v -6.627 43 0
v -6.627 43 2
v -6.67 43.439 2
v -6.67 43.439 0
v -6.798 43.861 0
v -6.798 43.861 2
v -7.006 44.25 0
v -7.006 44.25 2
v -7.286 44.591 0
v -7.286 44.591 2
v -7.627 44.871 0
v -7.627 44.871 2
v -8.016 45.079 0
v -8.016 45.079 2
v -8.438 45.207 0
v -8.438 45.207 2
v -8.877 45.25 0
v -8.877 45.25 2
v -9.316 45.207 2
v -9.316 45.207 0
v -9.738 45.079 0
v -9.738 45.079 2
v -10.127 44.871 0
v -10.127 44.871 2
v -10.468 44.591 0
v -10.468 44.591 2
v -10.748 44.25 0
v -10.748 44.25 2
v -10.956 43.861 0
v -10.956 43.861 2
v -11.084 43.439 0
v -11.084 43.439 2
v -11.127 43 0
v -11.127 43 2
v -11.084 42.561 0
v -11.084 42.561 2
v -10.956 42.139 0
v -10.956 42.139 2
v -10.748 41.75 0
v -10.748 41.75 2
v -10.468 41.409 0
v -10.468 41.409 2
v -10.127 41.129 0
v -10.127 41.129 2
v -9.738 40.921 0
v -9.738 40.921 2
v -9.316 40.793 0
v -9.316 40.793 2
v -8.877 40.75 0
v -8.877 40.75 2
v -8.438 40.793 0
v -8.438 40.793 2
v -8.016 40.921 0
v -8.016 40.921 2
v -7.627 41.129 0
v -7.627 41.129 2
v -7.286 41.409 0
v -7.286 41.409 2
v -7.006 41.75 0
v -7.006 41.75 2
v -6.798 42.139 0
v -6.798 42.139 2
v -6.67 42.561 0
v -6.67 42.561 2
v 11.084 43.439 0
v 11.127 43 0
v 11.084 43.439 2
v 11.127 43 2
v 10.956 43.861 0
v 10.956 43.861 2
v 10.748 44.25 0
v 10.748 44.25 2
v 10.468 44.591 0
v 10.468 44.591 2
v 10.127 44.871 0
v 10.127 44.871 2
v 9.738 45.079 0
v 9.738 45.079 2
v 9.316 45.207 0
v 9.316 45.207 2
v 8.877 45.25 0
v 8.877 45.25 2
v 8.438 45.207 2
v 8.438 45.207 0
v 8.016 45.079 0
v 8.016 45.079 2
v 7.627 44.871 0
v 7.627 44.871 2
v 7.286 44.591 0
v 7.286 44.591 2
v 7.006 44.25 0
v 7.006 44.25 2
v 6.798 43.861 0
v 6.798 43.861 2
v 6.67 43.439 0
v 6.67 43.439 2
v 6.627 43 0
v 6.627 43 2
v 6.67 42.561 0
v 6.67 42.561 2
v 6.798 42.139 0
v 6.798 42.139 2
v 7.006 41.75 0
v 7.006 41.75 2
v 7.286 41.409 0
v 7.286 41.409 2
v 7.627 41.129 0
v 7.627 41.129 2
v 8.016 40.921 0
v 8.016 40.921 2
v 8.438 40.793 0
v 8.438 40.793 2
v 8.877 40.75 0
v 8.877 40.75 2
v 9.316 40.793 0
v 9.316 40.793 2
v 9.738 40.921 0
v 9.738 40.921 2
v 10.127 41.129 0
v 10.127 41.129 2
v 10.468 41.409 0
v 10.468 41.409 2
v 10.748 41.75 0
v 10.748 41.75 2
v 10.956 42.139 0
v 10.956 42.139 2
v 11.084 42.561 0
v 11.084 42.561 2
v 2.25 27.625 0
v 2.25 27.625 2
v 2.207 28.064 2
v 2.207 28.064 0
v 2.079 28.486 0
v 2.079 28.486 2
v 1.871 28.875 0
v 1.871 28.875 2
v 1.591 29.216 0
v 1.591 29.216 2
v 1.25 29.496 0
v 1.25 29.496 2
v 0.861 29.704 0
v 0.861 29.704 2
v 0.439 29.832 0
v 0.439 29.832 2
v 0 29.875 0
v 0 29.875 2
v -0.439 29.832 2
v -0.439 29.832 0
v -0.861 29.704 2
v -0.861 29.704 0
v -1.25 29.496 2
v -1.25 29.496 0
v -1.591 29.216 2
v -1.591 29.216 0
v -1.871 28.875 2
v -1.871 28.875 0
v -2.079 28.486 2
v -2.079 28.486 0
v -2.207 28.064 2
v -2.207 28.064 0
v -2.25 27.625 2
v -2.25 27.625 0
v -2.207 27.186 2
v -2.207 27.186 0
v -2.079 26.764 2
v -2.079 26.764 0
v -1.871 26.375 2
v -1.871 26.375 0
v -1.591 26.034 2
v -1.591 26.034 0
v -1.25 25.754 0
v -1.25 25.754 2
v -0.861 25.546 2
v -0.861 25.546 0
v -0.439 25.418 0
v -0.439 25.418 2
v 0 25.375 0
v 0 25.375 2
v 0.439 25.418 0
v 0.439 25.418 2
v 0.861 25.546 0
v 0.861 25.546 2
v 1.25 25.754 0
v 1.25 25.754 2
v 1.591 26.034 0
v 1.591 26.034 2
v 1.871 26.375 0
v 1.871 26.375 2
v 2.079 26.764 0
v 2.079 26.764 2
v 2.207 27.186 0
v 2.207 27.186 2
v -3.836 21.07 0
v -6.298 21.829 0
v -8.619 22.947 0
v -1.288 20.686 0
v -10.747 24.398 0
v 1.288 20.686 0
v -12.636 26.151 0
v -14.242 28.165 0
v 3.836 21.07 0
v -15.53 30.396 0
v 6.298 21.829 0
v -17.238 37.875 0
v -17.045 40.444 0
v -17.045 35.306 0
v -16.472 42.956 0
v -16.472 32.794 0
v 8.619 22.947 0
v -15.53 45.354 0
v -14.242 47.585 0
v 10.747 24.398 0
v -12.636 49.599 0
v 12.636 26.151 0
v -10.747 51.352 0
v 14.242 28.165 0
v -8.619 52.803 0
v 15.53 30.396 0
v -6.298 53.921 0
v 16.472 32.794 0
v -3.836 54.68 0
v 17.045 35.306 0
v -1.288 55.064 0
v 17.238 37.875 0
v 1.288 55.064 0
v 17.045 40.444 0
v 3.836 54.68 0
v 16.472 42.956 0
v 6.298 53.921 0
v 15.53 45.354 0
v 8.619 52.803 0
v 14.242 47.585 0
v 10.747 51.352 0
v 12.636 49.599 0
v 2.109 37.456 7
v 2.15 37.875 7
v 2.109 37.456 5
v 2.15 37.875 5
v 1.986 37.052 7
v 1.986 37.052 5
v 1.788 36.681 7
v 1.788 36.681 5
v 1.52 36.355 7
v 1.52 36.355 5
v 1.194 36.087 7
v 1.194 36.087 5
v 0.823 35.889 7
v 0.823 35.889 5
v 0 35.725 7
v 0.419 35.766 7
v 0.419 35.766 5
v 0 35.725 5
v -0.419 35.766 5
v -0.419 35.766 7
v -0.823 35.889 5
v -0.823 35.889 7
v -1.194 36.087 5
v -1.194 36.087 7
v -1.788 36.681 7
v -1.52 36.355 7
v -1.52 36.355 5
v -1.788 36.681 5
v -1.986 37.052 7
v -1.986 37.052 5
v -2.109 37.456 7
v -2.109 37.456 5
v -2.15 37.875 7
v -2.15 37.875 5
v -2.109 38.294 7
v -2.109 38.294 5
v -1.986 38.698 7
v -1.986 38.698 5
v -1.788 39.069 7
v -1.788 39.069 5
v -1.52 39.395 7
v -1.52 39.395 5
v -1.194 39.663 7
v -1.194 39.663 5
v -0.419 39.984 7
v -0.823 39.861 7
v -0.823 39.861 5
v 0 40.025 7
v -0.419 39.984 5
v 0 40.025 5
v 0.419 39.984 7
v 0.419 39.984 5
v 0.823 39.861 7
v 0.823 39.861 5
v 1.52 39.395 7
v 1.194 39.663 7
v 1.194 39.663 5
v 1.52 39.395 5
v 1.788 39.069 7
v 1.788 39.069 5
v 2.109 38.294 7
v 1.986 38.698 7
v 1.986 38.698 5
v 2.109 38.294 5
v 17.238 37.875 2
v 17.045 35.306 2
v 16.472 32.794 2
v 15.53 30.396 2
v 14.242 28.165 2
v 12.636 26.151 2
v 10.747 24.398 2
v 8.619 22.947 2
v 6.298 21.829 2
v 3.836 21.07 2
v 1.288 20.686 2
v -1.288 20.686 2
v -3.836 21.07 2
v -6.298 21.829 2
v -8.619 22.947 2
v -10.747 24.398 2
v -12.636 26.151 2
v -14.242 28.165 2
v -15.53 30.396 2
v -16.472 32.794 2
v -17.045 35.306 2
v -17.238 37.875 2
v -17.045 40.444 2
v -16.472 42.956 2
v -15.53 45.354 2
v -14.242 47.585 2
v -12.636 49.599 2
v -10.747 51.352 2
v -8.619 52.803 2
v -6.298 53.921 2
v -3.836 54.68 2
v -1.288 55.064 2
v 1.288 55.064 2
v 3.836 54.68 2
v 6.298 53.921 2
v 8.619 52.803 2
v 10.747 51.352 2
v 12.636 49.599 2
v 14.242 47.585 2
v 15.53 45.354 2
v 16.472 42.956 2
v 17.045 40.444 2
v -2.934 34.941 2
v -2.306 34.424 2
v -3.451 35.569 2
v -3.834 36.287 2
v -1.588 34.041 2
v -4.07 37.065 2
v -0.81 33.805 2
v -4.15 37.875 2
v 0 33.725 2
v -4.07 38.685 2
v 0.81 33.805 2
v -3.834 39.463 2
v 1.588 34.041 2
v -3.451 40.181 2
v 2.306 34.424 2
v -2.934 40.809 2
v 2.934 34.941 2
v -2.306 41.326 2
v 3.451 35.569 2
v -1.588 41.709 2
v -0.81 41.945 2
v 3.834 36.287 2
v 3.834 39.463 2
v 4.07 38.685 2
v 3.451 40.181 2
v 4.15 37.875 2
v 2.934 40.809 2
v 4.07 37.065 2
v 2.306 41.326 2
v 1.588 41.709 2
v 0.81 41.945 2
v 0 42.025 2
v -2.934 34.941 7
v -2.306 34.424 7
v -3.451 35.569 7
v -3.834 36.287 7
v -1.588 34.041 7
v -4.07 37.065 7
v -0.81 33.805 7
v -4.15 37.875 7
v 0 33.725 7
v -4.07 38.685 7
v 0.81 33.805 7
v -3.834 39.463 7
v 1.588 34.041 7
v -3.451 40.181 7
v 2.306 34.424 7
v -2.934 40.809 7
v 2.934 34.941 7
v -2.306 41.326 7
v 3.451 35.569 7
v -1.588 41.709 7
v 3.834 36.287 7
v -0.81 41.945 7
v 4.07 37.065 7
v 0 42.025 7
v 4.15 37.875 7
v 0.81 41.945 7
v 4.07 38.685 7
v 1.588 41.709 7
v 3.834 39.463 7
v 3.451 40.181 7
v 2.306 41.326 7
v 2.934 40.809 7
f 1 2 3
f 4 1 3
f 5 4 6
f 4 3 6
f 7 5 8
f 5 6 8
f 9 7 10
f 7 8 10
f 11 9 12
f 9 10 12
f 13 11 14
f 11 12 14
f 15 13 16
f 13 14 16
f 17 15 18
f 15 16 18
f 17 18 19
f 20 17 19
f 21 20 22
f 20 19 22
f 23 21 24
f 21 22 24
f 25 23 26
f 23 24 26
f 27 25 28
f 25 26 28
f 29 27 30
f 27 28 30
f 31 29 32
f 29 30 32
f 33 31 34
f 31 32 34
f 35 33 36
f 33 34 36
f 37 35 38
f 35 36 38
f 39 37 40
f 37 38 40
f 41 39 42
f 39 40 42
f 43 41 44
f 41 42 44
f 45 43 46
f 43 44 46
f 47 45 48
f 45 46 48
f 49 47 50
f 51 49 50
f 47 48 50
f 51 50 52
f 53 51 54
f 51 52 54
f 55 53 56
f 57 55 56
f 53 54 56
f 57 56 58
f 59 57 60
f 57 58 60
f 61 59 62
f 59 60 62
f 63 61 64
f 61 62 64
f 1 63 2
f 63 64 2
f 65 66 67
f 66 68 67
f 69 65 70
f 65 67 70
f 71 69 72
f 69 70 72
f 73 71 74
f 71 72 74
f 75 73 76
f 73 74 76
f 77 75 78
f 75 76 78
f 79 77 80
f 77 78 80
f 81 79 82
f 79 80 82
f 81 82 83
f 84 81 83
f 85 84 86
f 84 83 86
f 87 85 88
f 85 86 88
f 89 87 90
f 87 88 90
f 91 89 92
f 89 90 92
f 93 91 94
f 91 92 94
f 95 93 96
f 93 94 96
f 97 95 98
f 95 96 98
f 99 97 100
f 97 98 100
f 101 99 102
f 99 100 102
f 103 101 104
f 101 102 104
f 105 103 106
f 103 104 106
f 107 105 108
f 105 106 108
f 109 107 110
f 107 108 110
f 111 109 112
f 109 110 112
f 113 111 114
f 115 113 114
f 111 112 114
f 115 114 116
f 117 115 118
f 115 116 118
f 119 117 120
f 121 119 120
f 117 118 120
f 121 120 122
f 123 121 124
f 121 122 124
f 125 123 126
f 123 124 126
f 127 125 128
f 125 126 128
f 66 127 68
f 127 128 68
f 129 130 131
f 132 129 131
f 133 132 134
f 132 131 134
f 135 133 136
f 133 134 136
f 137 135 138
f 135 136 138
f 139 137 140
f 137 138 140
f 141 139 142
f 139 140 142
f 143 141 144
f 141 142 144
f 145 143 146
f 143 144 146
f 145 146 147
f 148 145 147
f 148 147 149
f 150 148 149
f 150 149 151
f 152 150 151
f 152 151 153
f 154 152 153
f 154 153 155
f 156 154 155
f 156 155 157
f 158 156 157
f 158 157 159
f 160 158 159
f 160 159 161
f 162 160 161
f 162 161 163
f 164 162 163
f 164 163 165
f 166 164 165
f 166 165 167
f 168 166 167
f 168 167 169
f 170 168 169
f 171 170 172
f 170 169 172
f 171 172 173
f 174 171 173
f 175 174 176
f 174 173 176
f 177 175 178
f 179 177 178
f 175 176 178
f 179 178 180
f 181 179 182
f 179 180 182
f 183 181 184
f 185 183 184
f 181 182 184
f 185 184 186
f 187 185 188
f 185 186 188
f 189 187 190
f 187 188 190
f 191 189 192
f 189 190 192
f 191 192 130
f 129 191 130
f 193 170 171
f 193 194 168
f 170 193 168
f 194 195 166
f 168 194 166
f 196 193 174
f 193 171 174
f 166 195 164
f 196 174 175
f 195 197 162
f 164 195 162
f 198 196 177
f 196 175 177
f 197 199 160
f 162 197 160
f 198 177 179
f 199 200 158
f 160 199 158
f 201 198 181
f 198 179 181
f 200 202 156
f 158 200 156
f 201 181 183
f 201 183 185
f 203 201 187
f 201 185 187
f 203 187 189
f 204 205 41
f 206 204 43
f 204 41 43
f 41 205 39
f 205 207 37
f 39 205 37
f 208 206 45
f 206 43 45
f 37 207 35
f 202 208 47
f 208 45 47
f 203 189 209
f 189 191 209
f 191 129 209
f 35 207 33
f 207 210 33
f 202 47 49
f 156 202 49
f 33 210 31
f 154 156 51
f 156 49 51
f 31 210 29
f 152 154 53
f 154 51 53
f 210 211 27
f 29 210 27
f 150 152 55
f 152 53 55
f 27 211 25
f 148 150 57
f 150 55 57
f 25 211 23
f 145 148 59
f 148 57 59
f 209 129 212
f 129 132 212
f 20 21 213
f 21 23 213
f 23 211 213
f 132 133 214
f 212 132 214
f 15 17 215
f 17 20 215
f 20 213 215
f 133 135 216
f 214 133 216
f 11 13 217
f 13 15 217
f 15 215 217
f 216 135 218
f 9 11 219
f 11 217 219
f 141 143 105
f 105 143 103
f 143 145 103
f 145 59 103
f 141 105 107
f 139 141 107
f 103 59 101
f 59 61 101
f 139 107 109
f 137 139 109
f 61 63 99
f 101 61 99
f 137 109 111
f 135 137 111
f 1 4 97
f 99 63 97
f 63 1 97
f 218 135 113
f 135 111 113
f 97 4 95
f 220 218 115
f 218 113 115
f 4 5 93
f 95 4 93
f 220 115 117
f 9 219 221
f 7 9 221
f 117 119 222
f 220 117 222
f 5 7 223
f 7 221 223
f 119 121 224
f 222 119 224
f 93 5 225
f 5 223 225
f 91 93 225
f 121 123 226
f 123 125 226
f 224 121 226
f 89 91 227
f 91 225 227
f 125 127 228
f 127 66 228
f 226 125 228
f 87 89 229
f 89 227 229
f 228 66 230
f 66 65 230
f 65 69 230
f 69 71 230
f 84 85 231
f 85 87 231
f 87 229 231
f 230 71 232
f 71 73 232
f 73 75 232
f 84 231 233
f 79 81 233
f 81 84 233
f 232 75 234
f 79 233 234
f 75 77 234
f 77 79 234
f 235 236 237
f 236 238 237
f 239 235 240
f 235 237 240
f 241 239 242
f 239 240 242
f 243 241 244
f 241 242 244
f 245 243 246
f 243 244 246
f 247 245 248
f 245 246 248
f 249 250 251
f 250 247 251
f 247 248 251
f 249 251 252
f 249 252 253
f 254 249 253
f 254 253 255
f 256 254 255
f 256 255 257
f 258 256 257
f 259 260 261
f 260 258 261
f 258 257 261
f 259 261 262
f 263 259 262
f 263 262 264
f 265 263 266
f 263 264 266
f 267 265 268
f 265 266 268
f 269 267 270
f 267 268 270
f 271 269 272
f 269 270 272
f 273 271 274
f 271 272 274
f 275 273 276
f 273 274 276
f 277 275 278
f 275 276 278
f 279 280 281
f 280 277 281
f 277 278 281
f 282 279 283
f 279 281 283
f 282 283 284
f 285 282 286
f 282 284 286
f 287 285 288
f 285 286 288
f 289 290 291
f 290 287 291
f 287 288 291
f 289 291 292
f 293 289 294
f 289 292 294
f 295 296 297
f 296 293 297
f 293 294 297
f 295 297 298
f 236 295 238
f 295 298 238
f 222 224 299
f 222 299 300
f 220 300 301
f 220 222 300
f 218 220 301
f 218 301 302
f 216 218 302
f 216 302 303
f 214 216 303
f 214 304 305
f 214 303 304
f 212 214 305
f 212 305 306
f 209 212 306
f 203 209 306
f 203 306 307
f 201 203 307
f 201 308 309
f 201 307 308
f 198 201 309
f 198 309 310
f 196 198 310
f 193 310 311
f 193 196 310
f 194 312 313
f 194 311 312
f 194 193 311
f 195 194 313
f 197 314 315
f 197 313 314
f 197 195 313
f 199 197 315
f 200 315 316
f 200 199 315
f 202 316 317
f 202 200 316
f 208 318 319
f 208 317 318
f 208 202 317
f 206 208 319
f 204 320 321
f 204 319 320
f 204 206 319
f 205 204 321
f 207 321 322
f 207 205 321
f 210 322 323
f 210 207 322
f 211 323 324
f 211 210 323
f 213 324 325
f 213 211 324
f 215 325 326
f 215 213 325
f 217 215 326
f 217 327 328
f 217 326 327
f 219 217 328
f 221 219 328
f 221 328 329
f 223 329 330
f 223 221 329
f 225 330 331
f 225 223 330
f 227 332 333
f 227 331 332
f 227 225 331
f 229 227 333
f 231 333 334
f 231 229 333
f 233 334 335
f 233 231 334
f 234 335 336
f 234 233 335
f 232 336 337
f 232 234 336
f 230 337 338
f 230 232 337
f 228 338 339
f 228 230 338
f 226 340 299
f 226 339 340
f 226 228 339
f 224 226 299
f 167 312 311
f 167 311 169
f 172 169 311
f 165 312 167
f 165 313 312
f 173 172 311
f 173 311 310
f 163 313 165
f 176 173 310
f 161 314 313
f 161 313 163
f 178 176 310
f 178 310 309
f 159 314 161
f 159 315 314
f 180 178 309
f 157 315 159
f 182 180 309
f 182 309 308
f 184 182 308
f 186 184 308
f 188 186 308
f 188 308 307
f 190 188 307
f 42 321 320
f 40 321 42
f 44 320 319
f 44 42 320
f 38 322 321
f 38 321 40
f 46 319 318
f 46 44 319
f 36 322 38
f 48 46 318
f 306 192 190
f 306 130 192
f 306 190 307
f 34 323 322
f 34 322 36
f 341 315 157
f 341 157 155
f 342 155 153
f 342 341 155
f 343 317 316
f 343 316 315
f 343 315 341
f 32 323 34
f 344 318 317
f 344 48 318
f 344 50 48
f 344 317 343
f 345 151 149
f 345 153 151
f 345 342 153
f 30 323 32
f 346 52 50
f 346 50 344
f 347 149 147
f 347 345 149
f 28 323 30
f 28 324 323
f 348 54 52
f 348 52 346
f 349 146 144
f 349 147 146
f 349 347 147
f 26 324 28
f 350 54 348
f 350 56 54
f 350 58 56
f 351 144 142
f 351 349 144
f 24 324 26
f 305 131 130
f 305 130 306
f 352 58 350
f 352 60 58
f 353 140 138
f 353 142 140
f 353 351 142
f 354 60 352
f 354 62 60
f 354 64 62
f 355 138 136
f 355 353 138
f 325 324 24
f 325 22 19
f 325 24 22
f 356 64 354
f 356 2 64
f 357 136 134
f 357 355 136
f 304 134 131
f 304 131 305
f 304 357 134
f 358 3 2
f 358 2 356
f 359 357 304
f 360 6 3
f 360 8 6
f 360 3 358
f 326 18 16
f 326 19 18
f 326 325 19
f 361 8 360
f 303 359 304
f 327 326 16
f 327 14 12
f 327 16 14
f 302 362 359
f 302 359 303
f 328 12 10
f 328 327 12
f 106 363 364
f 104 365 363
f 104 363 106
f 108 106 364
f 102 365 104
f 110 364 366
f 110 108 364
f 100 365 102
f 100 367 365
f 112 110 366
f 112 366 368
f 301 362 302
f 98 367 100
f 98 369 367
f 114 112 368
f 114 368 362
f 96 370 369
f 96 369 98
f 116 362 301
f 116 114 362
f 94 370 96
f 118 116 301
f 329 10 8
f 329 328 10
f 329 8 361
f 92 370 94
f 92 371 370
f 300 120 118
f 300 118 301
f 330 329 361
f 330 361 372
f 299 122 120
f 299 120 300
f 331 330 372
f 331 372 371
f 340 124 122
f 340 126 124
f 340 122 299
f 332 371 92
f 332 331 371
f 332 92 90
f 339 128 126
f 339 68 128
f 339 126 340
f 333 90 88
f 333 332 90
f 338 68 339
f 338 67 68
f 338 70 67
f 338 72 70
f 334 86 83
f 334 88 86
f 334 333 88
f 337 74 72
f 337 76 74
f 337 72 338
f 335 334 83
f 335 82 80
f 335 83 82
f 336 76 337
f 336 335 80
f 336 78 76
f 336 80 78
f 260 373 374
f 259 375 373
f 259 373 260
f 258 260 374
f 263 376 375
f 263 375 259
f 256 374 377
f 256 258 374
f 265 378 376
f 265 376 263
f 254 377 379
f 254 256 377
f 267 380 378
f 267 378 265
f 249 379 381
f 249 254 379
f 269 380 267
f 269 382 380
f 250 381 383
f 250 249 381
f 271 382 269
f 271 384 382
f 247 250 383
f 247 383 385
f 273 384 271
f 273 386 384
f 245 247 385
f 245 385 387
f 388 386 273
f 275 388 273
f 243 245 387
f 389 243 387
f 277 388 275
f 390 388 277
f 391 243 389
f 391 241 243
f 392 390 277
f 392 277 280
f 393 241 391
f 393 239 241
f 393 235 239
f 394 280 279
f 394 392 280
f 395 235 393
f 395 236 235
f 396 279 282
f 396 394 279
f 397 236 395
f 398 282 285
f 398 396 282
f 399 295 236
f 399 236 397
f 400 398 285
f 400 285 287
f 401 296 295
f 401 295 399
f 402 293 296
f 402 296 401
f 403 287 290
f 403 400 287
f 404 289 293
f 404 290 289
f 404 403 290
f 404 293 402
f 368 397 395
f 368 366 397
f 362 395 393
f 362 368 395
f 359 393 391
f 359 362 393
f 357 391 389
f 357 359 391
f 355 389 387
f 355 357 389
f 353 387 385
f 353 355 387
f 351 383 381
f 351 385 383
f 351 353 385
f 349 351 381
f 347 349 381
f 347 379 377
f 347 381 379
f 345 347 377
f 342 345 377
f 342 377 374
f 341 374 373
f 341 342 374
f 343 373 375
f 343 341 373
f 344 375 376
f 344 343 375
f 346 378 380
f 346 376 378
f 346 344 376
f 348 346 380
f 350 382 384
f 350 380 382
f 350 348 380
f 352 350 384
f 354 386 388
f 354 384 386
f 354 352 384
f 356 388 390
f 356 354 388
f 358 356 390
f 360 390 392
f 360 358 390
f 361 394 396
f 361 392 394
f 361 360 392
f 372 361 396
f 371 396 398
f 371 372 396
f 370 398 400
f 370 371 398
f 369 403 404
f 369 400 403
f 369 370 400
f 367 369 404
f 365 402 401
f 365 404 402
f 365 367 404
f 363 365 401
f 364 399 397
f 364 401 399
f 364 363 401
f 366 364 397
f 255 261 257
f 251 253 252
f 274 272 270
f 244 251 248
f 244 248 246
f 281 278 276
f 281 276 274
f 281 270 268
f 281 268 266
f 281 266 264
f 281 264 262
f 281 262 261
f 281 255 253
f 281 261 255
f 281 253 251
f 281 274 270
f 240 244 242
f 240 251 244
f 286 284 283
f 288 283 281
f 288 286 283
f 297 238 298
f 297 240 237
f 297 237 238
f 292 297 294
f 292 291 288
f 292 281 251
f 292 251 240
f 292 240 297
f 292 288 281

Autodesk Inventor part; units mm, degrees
ref_plane "YZ Plane" through (0, 0, 0) normal (1, 0, 0) x (0, 1, 0)
ref_plane "XZ Plane" through (0, 0, 0) normal (0, 1, 0) x (-1, 0, 0)
ref_plane "XY Plane" through (0, 0, 0) normal (0, 0, 1) x (1, 0, 0)
sketch "Szkic1" plane through (0, 0, 0) normal (0, 0, 1) x (1, 0, 0)
  circle A0 centre (-8.8768, 43) radius 2 projected
  circle A1 centre (8.8768, 43) radius 2 projected
  circle A2 centre (0, 27.625) radius 2 projected
  line L0 (20.7693, 46.5287) -> (55.6245, -37.125) projected
  arc A3 (20.7693, 46.5287) -> (-20.7693, 46.5287) centre (0, 37.875) ccw projected
  line L1 (-55.6245, -37.125) -> (-20.7693, 46.5287) projected
  line L2 (-55.6245, -63.375) -> (-55.6245, -37.125) projected
  line L3 (55.6245, -63.375) -> (-55.6245, -63.375) projected
  line L4 (55.6245, -37.125) -> (55.6245, -63.375) projected
  circle A4 centre (-50, -53.375) radius 2.75 projected
  circle A5 centre (50, -53.375) radius 2.75 projected
  circle A6 centre (-25, -45.375) radius 2.75 projected
  circle A7 centre (25, -45.375) radius 2.75 projected
  circle A8 centre (0, -53.375) radius 2.75 projected
  circle A9 centre (0, 37.875) radius 17.2375
  circle A10 centre (0, 37.875) radius 2.1667
  point P0 (0, 0)
extrude "Wyciągnięcie proste1" add sketch "Szkic1" along normal blind 2.54 contours A9
sketch "Szkic2" plane through (0, 37.875, 2.54) normal (0, 0, 1) x (1, 0, 0)
  circle A0 centre (0, 0) radius 17.2375 projected
  circle A1 centre (0, 0) radius 2.1667 projected
  circle A2 centre (0, -10.25) radius 2 projected
  circle A3 centre (8.8768, 5.125) radius 2 projected
  circle A4 centre (-8.8768, 5.125) radius 2 projected
  point P0 (0, -37.875)
extrude "Wyciągnięcie proste2" cut sketch "Szkic2" against normal blind 0.54
sketch "Szkic3" plane through (0, 37.875, 2) normal (0, 0, 1) x (1, 0, 0)
  circle A0 centre (0, 0) radius 17.2375 projected
  circle A1 centre (-8.8768, 5.125) radius 2 projected
  circle A2 centre (8.8768, 5.125) radius 2 projected
  circle A3 centre (0, -10.25) radius 2 projected
  circle A4 centre (0, 0) radius 2.1667 projected
  point P0 (0, -37.875)
extrude "Wyciągnięcie proste3" add sketch "Szkic3" against normal up to surface (2 mm away) contours A4
sketch "Szkic4" plane through (0, 37.875, 2) normal (0, 0, 1) x (1, 0, 0)
  circle A0 centre (0, 0) radius 17.2375 projected
  circle A1 centre (-8.8768, 5.125) radius 2 projected
  circle A2 centre (8.8768, 5.125) radius 2 projected
  circle A3 centre (0, -10.25) radius 2 projected
  circle A4 centre (0, 0) radius 2.15
  line L0 (2.15, 0) -> (4.15, 0)
  circle A5 centre (0, 0) radius 4.15
  point P0 (0, -37.875)
  dimension "d6" = 4.3
  dimension "d7" = 2
extrude "Wyciągnięcie proste4" add sketch "Szkic4" along normal blind 5 contours A5
sketch "Szkic5" plane through (0, 37.875, 2) normal (0, 0, 1) x (1, 0, 0)
  circle A0 centre (0, 0) radius 2.15 projected
  point P0 (0, -37.875)
extrude "Wyciągnięcie proste5" add sketch "Szkic5" along normal blind 3
sketch "Szkic6" plane through (0, 37.875, 2) normal (0, 0, 1) x (1, 0, 0)
  circle A0 centre (0, 0) radius 17.2375 projected
  circle A1 centre (-8.8768, 5.125) radius 2 projected
  circle A2 centre (8.8768, 5.125) radius 2 projected
  circle A3 centre (0, -10.25) radius 2 projected
  circle A4 centre (0, -10.25) radius 2.25
  circle A5 centre (-8.8768, 5.125) radius 2.25
  circle A6 centre (8.8768, 5.125) radius 2.25
  point P0 (0, -37.875)
  dimension "d16" = 4.5
  dimension "d17" = 4.5
  dimension "d18" = 4.5
extrude "Wyciągnięcie proste6" cut sketch "Szkic6" against normal through all contours A1 | A2 | A3 | A4 | A5 | A6
properties part number "na magnes"
